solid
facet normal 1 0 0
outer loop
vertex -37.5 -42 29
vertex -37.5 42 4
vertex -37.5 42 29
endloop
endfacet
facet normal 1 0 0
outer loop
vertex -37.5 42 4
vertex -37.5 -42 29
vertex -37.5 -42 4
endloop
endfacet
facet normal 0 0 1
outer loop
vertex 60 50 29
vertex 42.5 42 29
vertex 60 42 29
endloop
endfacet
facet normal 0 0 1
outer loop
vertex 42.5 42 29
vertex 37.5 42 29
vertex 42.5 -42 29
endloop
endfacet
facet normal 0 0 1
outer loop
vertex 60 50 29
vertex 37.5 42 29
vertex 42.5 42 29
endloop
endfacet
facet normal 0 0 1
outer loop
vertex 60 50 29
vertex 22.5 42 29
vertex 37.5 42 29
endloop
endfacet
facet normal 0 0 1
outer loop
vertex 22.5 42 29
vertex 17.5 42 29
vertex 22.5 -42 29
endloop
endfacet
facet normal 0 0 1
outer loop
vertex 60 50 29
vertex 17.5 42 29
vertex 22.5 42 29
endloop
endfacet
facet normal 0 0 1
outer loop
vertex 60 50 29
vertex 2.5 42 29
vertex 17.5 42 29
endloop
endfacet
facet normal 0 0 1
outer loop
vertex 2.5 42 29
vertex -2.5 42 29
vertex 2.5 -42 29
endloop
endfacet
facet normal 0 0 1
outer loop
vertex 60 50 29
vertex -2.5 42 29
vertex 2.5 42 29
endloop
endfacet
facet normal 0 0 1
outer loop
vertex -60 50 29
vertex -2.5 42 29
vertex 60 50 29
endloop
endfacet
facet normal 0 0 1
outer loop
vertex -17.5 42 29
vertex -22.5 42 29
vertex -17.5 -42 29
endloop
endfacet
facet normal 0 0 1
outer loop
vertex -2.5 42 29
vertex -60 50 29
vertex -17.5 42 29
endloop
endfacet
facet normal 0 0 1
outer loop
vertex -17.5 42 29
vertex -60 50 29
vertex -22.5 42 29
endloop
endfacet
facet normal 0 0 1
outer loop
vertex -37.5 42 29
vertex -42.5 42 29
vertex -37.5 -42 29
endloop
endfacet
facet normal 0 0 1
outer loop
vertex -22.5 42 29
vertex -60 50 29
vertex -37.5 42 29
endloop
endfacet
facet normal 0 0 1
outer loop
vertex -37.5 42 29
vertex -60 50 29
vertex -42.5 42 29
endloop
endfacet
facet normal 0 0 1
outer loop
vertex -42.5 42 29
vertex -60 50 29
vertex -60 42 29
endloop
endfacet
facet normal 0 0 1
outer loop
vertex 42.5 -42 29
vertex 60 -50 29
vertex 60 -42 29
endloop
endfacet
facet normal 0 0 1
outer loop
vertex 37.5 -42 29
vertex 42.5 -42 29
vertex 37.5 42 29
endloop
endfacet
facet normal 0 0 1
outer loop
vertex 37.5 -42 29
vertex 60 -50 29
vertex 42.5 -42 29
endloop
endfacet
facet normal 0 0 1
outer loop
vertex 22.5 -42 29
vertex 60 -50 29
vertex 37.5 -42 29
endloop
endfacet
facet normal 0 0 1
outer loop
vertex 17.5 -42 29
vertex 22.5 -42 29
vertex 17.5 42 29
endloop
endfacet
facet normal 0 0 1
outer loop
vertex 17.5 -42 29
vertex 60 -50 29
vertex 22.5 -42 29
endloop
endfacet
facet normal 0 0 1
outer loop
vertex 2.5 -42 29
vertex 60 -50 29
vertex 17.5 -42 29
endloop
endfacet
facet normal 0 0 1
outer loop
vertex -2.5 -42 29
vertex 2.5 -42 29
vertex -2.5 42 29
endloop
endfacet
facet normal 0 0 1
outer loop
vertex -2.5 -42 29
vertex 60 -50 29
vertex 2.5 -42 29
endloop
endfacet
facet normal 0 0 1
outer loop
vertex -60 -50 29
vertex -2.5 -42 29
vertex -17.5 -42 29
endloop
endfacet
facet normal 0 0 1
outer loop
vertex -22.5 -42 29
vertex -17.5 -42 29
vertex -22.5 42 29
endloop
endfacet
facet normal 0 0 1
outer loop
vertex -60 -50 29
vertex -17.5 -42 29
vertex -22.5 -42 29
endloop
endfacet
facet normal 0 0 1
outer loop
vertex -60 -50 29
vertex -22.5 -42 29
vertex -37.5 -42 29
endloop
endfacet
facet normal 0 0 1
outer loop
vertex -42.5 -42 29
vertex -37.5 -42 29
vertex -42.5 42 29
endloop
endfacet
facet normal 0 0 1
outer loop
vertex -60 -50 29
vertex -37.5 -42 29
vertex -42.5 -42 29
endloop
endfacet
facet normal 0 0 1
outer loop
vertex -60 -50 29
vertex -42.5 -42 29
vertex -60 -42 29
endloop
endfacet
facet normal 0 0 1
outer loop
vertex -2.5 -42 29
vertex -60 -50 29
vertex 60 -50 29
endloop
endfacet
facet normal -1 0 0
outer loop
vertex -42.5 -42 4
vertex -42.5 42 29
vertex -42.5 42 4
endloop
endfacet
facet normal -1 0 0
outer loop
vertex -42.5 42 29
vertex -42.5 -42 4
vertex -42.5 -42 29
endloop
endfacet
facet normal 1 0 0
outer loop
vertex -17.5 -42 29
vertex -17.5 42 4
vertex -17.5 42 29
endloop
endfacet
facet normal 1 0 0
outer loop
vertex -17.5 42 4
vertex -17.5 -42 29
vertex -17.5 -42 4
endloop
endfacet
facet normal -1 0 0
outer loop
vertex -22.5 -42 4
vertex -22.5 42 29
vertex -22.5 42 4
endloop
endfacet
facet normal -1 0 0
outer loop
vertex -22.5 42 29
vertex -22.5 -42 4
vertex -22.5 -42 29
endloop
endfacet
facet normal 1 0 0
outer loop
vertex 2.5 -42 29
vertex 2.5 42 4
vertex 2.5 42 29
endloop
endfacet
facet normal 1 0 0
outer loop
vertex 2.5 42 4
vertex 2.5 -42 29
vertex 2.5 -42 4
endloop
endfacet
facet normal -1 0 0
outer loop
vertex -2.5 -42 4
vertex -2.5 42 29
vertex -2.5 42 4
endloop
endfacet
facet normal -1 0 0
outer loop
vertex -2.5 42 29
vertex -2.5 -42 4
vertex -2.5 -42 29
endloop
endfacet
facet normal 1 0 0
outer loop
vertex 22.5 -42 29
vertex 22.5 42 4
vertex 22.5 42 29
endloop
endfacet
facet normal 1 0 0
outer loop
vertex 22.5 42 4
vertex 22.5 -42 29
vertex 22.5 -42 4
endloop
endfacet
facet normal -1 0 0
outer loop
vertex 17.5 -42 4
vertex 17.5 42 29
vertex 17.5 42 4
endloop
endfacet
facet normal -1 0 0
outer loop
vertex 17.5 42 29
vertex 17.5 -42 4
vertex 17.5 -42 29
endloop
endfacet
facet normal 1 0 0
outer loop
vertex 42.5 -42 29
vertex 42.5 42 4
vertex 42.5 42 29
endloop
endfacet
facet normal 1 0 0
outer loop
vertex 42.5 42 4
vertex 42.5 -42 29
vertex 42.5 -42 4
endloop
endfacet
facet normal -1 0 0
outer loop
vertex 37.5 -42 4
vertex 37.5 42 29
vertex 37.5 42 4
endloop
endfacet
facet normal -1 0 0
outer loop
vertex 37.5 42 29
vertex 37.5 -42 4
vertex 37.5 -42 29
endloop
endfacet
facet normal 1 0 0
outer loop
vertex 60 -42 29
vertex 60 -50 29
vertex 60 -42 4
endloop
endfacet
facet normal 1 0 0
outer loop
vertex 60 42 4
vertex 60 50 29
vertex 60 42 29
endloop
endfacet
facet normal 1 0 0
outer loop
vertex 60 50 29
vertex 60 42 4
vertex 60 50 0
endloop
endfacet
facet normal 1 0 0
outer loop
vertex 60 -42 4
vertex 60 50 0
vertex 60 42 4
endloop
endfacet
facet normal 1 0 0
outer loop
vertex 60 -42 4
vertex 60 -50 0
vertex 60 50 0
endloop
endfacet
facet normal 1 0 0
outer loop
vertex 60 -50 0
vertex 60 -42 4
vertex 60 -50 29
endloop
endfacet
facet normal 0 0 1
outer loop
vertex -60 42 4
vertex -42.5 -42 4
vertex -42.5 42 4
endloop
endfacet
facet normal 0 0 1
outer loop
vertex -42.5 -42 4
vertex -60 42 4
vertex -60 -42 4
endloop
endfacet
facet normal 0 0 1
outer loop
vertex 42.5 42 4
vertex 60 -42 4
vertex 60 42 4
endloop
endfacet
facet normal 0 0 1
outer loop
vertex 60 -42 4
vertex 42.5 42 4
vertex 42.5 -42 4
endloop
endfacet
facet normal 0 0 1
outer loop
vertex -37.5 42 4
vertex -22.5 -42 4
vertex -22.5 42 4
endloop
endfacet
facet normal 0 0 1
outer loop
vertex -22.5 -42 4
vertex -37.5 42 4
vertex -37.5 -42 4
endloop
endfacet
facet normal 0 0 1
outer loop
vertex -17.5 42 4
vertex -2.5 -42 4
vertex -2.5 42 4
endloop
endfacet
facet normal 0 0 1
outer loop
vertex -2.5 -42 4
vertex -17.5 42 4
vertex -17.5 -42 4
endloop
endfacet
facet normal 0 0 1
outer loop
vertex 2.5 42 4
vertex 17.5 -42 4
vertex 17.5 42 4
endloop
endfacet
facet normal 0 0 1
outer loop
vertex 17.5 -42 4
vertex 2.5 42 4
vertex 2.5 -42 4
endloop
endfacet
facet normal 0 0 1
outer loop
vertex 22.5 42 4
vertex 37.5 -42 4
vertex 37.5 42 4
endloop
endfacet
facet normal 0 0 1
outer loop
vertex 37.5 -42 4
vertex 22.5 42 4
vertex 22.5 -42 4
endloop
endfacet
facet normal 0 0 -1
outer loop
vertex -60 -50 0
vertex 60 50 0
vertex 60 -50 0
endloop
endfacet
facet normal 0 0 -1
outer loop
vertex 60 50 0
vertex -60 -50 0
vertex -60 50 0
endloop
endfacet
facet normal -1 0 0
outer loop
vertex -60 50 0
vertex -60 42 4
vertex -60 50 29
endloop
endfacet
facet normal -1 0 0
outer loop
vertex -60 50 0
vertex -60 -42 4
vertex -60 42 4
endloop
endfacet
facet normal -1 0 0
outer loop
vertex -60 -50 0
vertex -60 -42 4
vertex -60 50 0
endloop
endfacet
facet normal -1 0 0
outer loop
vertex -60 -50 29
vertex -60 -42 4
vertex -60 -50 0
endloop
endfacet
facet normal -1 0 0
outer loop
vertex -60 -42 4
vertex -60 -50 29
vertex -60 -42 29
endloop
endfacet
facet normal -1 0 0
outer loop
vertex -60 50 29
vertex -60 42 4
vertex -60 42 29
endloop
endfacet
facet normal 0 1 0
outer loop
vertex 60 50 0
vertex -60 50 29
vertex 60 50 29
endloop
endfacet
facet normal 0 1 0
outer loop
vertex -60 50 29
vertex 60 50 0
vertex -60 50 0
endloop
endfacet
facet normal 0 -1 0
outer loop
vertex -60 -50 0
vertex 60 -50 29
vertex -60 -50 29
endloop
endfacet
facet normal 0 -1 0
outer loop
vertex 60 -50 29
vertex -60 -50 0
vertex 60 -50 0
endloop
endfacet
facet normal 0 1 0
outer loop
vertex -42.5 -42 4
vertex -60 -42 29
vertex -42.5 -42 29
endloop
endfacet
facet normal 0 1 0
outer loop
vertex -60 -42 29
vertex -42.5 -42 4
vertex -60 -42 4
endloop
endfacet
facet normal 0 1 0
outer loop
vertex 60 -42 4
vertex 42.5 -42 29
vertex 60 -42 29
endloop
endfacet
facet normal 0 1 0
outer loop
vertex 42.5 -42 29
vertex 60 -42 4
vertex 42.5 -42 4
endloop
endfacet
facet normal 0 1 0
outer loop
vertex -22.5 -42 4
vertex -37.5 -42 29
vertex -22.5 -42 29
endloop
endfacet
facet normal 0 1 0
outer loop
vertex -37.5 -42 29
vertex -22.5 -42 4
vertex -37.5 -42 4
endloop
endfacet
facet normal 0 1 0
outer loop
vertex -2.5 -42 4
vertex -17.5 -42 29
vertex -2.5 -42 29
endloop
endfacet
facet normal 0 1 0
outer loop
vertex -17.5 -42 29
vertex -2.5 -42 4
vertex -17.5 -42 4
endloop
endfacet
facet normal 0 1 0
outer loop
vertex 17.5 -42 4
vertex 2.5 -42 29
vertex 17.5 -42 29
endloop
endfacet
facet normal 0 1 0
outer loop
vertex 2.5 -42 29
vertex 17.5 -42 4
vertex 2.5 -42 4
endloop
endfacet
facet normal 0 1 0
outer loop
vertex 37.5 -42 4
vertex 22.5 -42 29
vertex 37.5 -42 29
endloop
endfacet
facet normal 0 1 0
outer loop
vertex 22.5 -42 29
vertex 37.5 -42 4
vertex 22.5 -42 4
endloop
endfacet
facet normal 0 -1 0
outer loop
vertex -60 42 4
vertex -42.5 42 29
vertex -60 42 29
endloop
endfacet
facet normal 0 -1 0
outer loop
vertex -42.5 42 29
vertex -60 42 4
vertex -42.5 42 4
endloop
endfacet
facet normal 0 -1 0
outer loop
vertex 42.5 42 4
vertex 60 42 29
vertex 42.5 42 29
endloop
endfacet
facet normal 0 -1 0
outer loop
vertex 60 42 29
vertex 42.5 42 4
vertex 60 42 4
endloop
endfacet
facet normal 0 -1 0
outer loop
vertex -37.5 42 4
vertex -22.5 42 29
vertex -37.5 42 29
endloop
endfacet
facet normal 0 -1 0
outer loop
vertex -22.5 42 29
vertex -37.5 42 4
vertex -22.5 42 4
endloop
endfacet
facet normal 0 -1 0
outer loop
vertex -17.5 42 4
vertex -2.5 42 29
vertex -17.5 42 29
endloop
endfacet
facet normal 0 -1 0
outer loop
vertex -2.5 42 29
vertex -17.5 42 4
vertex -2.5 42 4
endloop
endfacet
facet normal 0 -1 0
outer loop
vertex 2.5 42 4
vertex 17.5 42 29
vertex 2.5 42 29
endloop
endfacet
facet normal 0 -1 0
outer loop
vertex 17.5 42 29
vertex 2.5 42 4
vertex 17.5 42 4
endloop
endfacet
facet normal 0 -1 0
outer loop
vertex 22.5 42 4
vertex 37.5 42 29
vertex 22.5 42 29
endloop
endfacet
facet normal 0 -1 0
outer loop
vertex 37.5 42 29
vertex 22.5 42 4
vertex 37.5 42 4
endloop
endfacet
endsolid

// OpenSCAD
$fn = 32;

// ----------------------------------------------------------------------
// Rib frame 120 x 100 x 29
// 5 ribs at 20 mm pitch
// ----------------------------------------------------------------------

// --- parameters (mm) ---
frame = [120, 100, 4];  // base plate size (x, y, z)
rail_w = 8;             // side rail width
ribs = 5;               // number of ribs
rib_t = 5;              // rib thickness
rib_h = 25;             // rib height above the base plate
pitch = 20;             // pitch between rib centres

// --- derived feature positions (mm) ---
span = (ribs - 1) * pitch;          // = 80   distance between the outer ribs
origin_x = -span / 2;               // = -40   X of the first rib
rib_len = frame[1] - 2 * rail_w + 2;  // = 86   rib length, 1 mm into each rail
feature_centers = [
  [origin_x + 0 * pitch, 0],
  [origin_x + 1 * pitch, 0],
  [origin_x + 2 * pitch, 0],
  [origin_x + 3 * pitch, 0],
  [origin_x + 4 * pitch, 0]
];   // rib centre line, drives the rib loop

// base plate, two side rails, then the ribs read straight off feature_centers
union() {
  translate([-frame[0] / 2, -frame[1] / 2, 0]) cube(frame);
  translate([-frame[0] / 2, -frame[1] / 2, 0]) cube([frame[0], rail_w, frame[2] + rib_h]);
  translate([-frame[0] / 2, frame[1] / 2 - rail_w, 0]) cube([frame[0], rail_w, frame[2] + rib_h]);
  for (centre = feature_centers)
    translate([centre[0] - rib_t / 2, centre[1] - rib_len / 2, frame[2] - 1])
      cube([rib_t, rib_len, rib_h + 1]);
}
